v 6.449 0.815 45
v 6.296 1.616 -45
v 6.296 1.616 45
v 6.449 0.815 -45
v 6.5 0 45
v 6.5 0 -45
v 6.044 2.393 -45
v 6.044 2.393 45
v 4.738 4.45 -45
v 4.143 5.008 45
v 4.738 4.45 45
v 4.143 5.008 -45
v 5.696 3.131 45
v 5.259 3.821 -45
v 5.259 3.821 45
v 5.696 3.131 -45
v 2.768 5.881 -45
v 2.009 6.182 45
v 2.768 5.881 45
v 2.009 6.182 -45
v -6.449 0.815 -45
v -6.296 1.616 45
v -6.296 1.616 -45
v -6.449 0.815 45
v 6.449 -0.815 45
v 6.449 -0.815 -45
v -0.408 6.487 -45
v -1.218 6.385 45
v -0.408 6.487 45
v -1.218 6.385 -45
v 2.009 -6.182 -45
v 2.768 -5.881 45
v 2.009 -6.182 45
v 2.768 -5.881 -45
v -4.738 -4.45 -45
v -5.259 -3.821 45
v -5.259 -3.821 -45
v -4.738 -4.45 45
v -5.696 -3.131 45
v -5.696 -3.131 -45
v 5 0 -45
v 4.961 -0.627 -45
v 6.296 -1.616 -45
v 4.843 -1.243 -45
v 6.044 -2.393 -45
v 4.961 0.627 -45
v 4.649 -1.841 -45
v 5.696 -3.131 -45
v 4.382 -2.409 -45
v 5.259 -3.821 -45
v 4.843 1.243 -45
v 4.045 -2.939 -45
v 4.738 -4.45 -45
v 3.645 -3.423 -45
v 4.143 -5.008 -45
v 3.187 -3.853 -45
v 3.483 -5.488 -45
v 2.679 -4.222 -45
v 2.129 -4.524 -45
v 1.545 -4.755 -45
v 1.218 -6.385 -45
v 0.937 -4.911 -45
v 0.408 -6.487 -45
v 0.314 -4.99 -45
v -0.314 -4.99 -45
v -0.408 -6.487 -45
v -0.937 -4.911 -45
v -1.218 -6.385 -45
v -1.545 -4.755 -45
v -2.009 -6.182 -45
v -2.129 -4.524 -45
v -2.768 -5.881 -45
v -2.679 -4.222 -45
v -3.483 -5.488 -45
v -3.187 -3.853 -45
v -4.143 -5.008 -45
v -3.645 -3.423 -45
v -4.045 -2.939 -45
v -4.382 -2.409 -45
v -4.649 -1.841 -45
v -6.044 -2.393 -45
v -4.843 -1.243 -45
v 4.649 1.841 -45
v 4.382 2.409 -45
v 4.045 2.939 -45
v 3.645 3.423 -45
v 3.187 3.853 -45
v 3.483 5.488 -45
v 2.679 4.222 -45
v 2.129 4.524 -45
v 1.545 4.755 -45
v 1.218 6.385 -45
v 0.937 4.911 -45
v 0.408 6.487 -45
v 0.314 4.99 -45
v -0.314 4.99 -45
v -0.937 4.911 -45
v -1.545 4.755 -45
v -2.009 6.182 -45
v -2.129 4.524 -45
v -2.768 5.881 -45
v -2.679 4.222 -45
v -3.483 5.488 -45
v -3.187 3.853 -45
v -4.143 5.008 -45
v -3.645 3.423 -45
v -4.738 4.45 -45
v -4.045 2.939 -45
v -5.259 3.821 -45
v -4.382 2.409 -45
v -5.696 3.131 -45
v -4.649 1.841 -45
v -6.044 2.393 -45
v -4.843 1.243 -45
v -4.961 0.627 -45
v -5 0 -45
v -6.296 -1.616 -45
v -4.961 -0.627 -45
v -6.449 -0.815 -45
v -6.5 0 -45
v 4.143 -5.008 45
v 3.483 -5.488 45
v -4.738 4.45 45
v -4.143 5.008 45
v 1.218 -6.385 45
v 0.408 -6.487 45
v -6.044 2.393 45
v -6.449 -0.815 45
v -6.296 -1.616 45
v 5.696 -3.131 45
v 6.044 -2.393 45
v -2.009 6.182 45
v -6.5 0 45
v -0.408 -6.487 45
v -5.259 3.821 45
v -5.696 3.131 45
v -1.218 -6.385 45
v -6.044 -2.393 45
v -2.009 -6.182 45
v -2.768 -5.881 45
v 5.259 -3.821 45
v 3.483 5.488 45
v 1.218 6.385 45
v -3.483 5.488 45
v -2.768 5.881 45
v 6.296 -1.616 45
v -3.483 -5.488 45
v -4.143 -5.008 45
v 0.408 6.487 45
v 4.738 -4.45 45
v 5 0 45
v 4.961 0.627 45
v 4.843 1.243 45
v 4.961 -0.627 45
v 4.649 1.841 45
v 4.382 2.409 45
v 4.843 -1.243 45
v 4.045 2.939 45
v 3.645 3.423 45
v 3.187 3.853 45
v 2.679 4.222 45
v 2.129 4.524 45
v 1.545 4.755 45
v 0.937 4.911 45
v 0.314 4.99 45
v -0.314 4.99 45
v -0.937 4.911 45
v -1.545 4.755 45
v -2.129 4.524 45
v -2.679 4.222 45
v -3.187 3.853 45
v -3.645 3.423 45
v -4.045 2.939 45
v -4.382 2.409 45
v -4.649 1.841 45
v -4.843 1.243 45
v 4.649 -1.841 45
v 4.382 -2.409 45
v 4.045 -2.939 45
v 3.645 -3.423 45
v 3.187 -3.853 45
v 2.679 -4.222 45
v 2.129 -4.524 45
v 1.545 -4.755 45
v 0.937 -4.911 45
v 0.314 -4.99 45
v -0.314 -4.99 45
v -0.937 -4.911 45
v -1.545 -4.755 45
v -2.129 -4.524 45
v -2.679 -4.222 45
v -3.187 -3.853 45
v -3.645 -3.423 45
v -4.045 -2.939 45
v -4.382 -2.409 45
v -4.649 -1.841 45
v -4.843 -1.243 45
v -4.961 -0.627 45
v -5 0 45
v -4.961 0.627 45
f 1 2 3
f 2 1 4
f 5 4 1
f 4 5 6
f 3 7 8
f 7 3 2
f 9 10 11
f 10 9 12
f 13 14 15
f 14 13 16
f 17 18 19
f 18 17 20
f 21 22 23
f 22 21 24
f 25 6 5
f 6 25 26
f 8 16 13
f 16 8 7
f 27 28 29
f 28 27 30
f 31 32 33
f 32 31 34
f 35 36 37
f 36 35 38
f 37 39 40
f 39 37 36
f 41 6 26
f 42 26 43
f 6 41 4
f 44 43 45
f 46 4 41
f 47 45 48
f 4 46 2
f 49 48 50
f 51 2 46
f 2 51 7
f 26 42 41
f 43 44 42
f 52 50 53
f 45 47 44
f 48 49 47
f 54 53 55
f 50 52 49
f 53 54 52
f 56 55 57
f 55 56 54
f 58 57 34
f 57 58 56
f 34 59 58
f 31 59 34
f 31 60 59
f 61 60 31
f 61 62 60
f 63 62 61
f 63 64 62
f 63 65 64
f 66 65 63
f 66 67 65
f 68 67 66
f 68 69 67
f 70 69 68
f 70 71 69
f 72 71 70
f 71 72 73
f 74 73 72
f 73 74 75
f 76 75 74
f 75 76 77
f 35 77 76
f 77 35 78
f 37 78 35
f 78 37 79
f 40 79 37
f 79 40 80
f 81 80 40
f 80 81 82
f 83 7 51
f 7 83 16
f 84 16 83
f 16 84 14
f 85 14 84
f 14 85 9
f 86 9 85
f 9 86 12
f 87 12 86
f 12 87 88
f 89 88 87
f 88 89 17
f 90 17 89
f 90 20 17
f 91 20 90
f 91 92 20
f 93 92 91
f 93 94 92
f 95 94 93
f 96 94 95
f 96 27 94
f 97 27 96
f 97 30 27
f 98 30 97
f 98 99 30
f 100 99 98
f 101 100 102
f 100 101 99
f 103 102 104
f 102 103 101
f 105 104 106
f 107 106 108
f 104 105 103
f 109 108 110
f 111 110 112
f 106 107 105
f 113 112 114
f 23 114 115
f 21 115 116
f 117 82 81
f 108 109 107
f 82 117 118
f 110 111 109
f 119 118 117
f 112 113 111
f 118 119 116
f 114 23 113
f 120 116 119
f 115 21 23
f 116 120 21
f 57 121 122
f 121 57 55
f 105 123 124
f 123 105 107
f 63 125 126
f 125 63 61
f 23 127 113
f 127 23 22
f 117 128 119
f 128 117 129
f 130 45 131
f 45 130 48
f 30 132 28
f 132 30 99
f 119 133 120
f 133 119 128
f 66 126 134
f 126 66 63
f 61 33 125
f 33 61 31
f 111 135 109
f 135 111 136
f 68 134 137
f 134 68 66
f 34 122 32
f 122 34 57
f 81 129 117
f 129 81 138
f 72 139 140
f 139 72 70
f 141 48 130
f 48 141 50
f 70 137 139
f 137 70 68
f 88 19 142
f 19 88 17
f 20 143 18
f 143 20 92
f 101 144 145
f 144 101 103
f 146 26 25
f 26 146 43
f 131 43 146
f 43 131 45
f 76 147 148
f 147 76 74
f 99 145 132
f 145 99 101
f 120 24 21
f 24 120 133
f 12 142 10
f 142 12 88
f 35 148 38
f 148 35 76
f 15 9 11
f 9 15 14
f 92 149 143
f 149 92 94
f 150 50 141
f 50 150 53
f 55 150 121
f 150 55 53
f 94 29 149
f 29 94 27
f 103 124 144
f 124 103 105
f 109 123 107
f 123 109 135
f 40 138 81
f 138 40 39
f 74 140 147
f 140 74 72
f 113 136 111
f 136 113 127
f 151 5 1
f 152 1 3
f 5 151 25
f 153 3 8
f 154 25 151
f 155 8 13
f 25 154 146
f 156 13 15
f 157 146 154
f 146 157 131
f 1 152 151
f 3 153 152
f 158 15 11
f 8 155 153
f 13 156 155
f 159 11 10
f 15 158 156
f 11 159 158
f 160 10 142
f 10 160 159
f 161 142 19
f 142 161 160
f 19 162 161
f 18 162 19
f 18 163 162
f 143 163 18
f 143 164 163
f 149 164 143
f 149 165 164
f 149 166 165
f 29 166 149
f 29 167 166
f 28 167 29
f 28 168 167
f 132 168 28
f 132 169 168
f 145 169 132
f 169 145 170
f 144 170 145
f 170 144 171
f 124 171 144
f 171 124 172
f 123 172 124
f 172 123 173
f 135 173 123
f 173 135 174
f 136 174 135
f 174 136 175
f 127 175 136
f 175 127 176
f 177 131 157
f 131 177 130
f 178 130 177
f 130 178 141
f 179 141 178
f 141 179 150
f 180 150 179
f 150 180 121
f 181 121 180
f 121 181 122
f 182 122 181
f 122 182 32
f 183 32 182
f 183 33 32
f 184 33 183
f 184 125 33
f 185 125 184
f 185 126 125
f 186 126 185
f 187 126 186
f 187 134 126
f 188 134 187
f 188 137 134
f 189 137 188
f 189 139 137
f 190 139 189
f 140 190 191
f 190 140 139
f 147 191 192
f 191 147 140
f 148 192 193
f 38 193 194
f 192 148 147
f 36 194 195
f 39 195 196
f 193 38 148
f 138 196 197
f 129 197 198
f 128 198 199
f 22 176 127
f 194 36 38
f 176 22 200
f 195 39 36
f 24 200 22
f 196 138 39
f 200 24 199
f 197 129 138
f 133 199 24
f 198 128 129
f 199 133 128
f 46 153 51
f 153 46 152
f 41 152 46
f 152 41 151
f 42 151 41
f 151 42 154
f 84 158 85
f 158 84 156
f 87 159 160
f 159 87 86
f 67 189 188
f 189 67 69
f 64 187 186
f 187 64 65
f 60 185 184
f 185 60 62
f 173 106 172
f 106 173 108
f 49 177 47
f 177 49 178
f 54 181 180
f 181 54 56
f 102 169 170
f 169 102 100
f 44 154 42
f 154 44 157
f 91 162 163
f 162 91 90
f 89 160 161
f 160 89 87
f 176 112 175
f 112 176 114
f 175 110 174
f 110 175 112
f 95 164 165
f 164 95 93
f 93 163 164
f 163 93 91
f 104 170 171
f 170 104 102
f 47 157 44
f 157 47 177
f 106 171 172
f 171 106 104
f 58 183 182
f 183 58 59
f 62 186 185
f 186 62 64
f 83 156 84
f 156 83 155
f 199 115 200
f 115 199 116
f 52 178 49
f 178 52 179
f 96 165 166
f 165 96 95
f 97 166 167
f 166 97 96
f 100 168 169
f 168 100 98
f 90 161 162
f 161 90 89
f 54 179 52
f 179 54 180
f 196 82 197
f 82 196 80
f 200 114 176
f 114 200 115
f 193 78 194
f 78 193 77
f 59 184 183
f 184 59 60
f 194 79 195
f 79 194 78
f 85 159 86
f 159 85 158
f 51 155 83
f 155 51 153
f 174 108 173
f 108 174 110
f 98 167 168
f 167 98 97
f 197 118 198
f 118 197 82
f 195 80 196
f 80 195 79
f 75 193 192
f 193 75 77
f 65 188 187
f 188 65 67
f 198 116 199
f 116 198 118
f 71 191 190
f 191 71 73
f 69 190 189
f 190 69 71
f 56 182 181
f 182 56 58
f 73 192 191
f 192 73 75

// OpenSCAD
$fn = 50;


difference() {
	union() {
		translate(v = [0, 0, -45.0000000000]) {
			cylinder(h = 90, r = 6.5000000000);
		}
	}
	union() {
		translate(v = [0, 0, -100.0000000000]) {
			cylinder(h = 200, r = 5.0000000000);
		}
	}
}
